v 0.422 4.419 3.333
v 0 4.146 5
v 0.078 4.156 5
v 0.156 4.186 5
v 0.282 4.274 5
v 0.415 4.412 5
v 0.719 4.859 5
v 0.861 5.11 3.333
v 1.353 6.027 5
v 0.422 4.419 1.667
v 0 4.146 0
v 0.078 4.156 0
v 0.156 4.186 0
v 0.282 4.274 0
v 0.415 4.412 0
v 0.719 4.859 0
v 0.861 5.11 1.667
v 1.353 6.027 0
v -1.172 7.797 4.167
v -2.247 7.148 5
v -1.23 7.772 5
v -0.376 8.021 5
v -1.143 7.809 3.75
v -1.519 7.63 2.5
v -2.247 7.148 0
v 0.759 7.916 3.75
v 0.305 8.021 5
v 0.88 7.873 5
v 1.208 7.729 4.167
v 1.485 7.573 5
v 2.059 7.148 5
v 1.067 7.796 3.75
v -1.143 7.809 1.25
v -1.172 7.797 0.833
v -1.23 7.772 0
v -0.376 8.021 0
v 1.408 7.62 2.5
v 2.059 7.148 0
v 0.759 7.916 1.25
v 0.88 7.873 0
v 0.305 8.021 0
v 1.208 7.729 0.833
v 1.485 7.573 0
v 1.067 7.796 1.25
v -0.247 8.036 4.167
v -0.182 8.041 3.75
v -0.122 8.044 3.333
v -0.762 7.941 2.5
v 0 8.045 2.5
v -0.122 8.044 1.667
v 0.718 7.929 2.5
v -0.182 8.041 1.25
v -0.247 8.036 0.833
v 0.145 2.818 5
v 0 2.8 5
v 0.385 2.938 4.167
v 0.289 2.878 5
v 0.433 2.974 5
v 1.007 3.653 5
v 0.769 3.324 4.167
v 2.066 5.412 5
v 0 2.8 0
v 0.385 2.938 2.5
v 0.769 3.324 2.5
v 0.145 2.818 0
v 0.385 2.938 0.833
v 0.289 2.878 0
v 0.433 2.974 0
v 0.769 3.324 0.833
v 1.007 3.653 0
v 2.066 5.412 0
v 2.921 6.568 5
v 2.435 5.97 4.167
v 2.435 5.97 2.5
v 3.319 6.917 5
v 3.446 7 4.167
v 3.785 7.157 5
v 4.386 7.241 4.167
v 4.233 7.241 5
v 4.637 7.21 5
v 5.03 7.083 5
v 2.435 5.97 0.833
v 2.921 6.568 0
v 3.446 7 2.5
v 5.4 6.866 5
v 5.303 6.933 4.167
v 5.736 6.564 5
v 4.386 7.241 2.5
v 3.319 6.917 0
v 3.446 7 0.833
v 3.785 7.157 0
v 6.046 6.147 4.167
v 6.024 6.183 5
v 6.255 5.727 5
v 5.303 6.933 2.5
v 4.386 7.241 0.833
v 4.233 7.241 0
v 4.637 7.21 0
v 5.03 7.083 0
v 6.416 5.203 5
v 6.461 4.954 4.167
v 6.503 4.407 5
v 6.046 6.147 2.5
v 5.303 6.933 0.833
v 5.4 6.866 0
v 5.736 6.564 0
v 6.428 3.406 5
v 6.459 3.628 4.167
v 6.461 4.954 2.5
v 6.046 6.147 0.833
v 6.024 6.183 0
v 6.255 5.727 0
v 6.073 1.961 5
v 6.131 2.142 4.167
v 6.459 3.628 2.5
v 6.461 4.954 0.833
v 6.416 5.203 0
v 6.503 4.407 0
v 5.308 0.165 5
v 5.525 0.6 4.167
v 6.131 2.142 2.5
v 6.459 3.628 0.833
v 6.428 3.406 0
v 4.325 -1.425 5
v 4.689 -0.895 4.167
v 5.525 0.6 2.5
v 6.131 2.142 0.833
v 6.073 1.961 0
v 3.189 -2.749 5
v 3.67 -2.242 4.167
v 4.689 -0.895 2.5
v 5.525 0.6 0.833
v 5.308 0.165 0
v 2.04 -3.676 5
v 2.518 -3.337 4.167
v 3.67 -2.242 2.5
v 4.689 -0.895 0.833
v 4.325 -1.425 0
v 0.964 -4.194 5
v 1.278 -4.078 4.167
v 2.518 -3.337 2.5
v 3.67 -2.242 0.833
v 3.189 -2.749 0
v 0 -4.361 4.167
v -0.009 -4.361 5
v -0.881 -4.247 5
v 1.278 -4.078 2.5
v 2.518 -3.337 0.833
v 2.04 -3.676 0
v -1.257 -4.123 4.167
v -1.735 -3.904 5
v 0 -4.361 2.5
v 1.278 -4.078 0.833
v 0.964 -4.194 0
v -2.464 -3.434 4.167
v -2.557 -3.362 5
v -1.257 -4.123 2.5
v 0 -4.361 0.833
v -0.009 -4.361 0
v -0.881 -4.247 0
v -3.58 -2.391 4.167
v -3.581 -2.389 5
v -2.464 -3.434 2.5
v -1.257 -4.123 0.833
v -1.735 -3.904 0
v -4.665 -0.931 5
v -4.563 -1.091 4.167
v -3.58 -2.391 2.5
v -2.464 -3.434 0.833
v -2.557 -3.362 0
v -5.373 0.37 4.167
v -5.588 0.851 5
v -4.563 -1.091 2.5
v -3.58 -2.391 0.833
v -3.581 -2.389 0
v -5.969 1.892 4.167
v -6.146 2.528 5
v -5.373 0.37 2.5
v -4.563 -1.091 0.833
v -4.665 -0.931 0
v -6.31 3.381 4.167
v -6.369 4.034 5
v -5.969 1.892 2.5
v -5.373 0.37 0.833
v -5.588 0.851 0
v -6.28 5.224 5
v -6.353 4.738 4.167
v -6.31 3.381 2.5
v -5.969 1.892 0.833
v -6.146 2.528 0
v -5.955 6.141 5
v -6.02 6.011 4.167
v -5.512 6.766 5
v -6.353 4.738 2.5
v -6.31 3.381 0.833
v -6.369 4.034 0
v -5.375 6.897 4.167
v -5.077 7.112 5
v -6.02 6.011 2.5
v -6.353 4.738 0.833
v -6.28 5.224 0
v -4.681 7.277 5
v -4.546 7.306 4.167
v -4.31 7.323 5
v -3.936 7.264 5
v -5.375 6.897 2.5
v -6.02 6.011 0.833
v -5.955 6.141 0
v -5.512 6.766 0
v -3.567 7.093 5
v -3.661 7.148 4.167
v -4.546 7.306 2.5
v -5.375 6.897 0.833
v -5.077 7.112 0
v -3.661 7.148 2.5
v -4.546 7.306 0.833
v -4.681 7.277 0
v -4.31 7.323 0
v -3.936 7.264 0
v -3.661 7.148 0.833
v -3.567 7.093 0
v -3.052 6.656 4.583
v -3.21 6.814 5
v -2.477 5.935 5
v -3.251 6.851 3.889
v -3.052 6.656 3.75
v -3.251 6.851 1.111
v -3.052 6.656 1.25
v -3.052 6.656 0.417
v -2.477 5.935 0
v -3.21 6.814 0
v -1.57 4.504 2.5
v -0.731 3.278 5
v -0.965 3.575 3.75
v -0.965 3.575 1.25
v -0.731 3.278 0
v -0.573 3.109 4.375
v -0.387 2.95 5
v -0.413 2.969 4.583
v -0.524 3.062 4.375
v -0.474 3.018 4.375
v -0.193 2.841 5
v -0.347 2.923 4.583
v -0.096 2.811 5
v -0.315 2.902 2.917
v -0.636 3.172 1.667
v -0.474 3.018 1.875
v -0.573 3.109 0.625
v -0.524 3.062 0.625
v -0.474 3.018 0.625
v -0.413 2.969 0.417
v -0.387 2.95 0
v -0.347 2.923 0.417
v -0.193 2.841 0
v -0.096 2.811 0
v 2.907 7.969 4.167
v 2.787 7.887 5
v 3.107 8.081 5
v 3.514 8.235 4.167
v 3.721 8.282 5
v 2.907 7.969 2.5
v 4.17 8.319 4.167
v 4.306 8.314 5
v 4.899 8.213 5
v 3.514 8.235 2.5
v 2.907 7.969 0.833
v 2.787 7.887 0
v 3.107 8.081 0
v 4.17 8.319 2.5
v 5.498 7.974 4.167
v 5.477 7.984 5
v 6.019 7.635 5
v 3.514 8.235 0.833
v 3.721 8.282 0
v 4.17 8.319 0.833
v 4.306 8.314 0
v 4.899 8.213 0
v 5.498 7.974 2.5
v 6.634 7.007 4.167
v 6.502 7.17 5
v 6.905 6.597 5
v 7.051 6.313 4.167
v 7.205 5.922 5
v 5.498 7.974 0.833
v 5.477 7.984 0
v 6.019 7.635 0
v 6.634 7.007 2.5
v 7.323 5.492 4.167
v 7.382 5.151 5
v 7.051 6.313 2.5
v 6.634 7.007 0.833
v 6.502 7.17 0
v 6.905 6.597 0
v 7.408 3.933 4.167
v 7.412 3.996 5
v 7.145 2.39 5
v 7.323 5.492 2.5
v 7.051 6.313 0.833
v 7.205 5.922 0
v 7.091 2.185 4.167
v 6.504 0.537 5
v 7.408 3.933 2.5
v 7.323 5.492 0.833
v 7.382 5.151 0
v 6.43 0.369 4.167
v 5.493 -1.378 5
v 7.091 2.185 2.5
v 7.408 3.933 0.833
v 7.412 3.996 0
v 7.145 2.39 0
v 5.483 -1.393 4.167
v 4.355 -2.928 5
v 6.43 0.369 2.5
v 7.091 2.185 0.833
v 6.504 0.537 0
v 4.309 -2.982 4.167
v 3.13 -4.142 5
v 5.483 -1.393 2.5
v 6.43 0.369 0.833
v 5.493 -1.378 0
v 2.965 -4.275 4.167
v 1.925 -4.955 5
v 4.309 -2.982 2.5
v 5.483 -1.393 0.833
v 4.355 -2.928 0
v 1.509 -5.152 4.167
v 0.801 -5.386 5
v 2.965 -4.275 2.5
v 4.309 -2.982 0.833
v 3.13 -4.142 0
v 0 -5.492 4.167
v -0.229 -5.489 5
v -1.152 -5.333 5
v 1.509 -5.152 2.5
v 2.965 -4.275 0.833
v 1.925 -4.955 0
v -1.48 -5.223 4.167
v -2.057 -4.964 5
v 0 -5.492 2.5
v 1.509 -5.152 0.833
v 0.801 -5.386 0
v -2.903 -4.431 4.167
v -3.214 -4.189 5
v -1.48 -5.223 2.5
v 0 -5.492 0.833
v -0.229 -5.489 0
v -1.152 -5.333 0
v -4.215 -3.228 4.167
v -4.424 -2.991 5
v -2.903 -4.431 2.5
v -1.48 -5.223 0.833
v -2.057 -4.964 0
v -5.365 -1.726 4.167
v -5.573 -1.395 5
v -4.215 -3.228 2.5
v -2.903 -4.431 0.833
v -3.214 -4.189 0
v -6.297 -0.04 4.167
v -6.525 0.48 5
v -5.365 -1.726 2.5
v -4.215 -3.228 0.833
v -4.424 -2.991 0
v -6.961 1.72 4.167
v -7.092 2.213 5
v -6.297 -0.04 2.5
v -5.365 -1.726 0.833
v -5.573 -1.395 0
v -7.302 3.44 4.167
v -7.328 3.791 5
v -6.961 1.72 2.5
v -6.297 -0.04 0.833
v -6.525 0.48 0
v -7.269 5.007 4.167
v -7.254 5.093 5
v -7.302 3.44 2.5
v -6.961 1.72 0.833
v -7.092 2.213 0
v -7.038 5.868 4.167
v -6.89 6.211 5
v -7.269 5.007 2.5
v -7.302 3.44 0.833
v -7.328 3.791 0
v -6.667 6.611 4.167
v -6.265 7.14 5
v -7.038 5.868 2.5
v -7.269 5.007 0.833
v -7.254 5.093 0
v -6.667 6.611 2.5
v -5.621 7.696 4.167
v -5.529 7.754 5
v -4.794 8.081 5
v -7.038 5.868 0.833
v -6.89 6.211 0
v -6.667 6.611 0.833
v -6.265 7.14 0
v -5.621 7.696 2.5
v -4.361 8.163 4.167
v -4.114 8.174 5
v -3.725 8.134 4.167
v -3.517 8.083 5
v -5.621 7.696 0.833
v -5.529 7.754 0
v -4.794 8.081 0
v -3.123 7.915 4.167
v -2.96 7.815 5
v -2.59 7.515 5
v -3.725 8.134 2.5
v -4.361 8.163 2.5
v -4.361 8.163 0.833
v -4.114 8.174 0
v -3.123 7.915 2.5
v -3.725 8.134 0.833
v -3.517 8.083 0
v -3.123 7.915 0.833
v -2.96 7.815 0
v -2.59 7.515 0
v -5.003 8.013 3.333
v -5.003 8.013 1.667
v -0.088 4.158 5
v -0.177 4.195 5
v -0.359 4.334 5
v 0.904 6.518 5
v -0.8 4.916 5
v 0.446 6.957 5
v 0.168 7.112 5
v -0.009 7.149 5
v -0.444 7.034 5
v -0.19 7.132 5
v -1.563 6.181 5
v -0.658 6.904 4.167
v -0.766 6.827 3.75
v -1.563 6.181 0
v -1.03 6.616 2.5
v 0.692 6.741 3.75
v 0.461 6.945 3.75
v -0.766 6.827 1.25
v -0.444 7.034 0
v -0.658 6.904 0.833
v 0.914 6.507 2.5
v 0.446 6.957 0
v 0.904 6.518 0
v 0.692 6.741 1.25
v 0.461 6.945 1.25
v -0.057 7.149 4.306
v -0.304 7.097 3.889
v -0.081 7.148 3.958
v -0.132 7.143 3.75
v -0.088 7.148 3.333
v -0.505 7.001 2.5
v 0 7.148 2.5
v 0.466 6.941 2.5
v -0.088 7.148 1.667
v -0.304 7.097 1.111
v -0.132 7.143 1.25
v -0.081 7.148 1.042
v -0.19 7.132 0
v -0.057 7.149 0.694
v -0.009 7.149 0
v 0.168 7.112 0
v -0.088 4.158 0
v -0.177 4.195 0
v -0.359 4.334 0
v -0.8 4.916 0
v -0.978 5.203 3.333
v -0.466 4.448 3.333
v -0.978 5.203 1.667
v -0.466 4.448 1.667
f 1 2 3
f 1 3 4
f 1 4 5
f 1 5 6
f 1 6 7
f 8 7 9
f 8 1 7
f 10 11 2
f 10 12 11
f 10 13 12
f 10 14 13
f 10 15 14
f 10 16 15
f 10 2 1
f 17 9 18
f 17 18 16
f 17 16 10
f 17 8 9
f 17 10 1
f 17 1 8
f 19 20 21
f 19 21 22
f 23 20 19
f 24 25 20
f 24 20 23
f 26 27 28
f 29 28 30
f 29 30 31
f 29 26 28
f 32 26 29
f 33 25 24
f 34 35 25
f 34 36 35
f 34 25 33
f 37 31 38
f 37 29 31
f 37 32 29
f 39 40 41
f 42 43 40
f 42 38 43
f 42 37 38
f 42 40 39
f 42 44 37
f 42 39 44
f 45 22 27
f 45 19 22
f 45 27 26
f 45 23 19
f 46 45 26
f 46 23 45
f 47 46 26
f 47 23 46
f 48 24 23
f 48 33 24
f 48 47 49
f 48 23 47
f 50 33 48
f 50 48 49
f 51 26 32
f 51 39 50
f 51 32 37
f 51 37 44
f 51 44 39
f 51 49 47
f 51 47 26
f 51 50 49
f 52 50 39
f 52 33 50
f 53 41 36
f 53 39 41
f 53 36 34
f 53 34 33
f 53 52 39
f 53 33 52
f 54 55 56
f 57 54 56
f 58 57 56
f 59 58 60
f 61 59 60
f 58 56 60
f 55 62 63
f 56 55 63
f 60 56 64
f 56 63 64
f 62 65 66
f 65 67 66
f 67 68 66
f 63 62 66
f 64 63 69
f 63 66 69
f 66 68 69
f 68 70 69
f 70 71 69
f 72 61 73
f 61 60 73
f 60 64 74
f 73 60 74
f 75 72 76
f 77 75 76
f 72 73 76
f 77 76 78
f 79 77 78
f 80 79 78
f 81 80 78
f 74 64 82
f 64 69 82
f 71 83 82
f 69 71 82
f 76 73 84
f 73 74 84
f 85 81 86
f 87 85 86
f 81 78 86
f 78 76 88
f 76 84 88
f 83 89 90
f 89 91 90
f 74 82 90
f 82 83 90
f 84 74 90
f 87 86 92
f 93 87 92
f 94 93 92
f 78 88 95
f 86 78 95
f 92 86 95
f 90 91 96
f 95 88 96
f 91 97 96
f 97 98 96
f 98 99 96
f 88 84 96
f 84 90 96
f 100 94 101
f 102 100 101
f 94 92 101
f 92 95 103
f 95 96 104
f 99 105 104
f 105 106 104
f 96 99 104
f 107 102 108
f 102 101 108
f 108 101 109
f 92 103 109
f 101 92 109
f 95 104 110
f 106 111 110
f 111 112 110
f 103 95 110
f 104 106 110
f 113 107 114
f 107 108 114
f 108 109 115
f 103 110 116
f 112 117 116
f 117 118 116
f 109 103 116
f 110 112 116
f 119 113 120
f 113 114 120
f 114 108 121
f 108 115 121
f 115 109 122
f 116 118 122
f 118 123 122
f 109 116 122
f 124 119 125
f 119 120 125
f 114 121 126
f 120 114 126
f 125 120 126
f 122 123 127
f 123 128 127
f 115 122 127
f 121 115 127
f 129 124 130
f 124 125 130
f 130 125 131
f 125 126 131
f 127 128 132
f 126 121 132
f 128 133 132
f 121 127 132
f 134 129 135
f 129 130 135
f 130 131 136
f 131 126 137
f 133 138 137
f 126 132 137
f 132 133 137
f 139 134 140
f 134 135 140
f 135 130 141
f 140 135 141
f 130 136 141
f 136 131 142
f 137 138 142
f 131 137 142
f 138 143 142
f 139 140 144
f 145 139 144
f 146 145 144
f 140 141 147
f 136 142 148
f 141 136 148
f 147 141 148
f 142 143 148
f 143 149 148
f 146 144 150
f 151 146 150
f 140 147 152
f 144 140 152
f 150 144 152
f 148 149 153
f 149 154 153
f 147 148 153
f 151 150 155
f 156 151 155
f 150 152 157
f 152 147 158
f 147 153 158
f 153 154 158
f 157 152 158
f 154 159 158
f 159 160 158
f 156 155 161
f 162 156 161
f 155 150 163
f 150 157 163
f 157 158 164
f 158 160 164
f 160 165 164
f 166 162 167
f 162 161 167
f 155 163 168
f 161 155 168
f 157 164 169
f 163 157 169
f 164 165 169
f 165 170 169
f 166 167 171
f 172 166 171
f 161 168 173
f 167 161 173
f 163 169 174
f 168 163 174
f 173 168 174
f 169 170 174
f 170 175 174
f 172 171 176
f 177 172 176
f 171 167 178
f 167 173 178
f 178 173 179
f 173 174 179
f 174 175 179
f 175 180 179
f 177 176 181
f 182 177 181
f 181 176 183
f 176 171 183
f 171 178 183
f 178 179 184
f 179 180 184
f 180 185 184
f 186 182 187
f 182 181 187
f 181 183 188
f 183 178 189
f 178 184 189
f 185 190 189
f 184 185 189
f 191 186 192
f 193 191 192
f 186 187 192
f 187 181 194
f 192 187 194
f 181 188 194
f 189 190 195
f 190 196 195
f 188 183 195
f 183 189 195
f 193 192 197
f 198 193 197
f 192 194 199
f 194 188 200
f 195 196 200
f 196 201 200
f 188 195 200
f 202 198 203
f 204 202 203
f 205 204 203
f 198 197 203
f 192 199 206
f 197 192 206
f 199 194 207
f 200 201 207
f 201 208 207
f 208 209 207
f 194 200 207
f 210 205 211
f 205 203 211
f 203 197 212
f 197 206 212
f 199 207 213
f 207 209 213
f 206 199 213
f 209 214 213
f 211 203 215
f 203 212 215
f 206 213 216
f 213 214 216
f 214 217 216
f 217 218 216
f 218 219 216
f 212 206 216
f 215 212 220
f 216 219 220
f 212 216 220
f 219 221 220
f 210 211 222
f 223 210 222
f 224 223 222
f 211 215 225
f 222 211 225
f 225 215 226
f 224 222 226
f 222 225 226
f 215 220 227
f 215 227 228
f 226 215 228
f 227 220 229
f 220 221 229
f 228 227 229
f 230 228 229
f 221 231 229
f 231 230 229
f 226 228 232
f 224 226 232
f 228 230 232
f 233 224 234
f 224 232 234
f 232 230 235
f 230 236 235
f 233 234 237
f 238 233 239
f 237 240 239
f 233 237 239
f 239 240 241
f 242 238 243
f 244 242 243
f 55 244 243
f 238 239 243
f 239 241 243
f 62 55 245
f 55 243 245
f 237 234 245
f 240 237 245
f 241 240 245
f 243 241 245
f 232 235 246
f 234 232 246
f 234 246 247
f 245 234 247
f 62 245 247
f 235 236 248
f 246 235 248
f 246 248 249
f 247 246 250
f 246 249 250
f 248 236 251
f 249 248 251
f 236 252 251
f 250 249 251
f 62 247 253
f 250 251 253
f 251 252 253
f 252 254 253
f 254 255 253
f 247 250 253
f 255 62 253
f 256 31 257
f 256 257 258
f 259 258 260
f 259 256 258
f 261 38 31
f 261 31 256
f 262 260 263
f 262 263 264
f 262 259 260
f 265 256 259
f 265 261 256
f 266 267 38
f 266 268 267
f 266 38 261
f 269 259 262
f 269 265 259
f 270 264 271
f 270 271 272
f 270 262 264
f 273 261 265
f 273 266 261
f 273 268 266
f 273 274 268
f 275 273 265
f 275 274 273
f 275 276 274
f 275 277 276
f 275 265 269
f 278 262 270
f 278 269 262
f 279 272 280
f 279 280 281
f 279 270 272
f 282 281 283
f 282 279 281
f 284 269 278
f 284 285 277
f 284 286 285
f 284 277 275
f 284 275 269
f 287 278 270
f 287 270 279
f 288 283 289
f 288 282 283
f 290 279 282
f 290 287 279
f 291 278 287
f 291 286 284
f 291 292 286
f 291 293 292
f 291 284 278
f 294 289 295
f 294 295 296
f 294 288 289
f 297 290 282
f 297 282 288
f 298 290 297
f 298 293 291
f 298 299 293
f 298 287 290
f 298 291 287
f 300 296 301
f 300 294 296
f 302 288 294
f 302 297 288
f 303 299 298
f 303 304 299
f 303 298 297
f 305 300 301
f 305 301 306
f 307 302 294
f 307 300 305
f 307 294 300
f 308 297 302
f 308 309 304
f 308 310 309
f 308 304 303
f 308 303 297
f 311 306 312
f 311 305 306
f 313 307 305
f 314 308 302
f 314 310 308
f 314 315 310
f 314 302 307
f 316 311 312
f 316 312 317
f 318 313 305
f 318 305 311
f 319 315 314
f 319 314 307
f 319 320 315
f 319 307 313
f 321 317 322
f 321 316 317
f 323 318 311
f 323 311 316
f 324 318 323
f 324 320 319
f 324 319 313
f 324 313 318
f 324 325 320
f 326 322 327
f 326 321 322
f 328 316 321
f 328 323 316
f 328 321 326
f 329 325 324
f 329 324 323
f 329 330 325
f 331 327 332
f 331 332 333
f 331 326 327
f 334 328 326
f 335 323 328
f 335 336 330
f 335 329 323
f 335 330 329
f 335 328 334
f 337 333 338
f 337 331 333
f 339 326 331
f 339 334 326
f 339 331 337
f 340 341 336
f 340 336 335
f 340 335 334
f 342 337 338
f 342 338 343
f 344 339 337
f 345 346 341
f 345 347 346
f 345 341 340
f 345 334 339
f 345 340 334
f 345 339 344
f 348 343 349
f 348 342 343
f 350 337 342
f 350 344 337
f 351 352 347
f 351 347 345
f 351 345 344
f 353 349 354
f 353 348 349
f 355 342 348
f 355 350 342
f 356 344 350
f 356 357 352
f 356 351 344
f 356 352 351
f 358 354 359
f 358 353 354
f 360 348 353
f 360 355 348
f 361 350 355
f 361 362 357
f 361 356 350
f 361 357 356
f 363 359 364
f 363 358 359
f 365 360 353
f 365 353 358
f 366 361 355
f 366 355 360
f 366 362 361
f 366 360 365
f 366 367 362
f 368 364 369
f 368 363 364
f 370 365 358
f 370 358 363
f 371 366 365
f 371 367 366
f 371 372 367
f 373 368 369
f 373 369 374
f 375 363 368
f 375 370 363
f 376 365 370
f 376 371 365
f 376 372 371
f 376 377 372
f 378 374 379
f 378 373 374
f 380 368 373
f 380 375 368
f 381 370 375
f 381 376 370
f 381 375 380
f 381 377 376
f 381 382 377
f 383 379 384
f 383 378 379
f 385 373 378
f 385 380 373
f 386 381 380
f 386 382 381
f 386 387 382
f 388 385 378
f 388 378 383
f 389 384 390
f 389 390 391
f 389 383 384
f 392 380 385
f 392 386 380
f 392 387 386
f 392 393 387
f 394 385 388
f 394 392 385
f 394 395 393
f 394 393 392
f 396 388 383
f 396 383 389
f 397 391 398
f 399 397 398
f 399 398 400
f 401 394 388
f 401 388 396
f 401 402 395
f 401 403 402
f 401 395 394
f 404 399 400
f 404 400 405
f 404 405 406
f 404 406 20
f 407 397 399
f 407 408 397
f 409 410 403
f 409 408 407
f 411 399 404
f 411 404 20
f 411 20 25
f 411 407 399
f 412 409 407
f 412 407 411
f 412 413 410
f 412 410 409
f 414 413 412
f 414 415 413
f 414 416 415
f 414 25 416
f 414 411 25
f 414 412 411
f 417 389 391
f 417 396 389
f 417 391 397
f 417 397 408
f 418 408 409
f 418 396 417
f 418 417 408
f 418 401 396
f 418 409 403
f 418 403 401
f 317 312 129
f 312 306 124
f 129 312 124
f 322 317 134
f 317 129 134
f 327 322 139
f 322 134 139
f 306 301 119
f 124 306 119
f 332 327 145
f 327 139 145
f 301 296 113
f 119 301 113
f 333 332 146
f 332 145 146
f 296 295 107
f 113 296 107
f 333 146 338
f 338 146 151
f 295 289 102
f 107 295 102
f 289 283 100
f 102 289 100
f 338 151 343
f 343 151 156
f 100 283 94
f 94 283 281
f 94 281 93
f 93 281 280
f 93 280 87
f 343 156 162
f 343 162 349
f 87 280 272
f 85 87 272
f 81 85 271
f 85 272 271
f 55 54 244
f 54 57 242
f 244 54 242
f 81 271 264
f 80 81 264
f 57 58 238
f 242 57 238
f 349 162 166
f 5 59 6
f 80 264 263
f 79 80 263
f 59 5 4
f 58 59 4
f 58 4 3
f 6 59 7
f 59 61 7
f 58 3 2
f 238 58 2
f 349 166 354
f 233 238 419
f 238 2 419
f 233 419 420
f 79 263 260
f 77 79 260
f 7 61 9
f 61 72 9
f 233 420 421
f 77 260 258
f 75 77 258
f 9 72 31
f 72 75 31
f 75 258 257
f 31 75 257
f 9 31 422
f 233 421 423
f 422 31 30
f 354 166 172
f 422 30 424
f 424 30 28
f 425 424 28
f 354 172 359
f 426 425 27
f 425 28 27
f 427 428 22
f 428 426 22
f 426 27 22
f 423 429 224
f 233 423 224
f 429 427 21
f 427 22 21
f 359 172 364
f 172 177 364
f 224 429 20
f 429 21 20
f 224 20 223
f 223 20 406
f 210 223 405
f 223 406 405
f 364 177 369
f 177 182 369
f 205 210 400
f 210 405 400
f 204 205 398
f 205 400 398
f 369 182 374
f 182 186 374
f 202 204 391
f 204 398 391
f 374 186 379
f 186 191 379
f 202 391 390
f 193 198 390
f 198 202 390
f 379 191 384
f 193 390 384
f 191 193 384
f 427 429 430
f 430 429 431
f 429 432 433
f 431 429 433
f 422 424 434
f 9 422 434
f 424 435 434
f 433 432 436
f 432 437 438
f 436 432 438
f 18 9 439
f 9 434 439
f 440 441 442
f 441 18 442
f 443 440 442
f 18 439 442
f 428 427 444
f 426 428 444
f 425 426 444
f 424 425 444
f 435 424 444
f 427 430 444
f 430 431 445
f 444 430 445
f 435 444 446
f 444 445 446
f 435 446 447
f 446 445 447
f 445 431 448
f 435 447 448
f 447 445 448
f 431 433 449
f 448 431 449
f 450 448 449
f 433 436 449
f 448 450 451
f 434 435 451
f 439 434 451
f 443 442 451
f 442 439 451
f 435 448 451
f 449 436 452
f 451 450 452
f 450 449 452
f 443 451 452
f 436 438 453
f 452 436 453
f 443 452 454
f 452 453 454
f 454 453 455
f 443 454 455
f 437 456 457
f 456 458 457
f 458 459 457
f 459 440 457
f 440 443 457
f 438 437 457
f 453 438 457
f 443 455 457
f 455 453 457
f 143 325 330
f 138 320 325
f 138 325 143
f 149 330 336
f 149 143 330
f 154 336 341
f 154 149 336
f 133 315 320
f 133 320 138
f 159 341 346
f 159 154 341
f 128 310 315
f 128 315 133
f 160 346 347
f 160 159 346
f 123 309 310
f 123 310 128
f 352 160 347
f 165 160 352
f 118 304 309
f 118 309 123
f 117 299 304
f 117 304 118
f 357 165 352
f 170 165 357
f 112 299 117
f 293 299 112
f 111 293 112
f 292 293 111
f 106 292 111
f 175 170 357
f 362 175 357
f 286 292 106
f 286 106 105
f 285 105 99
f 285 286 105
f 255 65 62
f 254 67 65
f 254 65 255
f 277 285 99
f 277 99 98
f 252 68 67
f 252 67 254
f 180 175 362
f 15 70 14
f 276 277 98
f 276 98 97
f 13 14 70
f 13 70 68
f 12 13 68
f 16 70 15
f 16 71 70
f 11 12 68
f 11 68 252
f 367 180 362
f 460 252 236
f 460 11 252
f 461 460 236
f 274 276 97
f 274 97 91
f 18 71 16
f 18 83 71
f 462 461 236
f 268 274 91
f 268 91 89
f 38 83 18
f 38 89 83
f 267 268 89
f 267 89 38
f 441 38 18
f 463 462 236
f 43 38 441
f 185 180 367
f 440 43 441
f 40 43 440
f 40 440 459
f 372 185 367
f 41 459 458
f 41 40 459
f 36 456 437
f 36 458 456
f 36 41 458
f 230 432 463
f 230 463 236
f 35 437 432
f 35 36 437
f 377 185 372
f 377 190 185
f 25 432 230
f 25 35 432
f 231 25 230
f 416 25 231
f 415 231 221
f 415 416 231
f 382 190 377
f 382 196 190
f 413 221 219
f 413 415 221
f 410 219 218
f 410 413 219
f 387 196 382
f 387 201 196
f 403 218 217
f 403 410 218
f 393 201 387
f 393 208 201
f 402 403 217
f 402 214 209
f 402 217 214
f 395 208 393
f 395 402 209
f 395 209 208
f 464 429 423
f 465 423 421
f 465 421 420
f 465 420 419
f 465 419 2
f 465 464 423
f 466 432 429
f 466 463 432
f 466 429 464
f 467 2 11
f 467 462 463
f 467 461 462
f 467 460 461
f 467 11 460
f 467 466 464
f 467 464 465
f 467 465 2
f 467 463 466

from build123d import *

# Parameters (mm, degrees)
F1_DEPTH = 5
F2_DEPTH = 5


with BuildPart() as f1:
    # F0 (on Top) → F1 (new body)
    with BuildSketch(Plane.XY):
        with BuildLine():
            add(Edge.make_bspline(
                [(0, 4.1458761205), (0.4251728121, 4.1469714189), (0.8223929175, 5.0606502095), (1.3531749, 6.0265546593)],
                knots=[0, 0, 0, 0, 0.0765595149, 0.0765595149, 0.0765595149, 0.0765595149], degree=3))
            add(Edge.make_bspline(
                [(-1.5634586702, 6.1805757618), (-0.9330409116, 5.1694999873), (-0.4508079304, 4.1447147827), (0, 4.1458761205)],
                knots=[0.9188244509, 0.9188244509, 0.9188244509, 0.9188244509, 1, 1, 1, 1], degree=3))
            add(Edge.make_bspline(
                [(-2.2471202075, 7.1480078623), (-1.9999117313, 6.8526730124), (-1.7734632609, 6.5173850463), (-1.5634586702, 6.1805757618)],
                knots=[0.8917832743, 0.8917832743, 0.8917832743, 0.8917832743, 0.9188244509, 0.9188244509, 0.9188244509, 0.9188244509], degree=3))
            add(Edge.make_bspline(
                [(2.0587463653, 7.1480078623), (2.3102169642, 7.4789881542), (3.9352571105, 9.1579500365), (10.6718271376, 6.0896679143), (0.0174467047, -12.3922555257), (-10.3794205218, 5.354508724), (-4.1956157642, 9.0408248225), (-2.5131929277, 7.465879434), (-2.2471202075, 7.1480078623)],
                knots=[0.1069595135, 0.1069595135, 0.1069595135, 0.1069595135, 0.1360278888, 0.2756819795, 0.5011998203, 0.7230047753, 0.8626786112, 0.8917832743, 0.8917832743, 0.8917832743, 0.8917832743], degree=3))
            add(Edge.make_bspline(
                [(1.3531749, 6.0265546593), (1.5639360512, 6.4100927984), (1.7957558897, 6.8018653518), (2.0587463653, 7.1480078623)],
                knots=[0.0765595149, 0.0765595149, 0.0765595149, 0.0765595149, 0.1069595135, 0.1069595135, 0.1069595135, 0.1069595135], degree=3))
        make_face()
        with BuildLine():
            add(Edge.make_bspline(
                [(0, 2.7998123893), (1.0340989918, 2.7791406676), (2.7557970722, 8.8582789448), (8.9245705944, 5.1398418843), (-0.0594070879, -10.2722849706), (-8.5444707281, 4.6876552471), (-3.1236585147, 9.1828392806), (-1.057798358, 2.8209578633), (0, 2.7998123893)],
                knots=[0, 0, 0, 0, 0.1531088486, 0.27850369, 0.4996783225, 0.7185160732, 0.8433822197, 1, 1, 1, 1], degree=3))
        make_face(mode=Mode.SUBTRACT)
        with BuildLine():
            add(Edge.make_bspline(
                [(-1.5634586702, 6.1805757618), (-1.0298012679, 6.5793822208), (0.0361797885, 7.7721255402), (0.9136382907, 6.471155864), (1.3531749, 6.0265546593)],
                knots=[0, 0, 0, 0, 0.5056378611, 1, 1, 1, 1], degree=3))
            add(Edge.make_bspline(
                [(1.3531749, 6.0265546593), (1.5639360512, 6.4100927984), (1.7957558897, 6.8018653518), (2.0587463653, 7.1480078623)],
                knots=[0.0765595149, 0.0765595149, 0.0765595149, 0.0765595149, 0.1069595135, 0.1069595135, 0.1069595135, 0.1069595135], degree=3))
            add(Edge.make_bspline(
                [(-2.2471202075, 7.1480078623), (-1.5414069401, 7.7049818886), (-0.0003649889, 8.3928342759), (1.4313487957, 7.6905926173), (2.0587463653, 7.1480078623)],
                knots=[0, 0, 0, 0, 0.5093201493, 1, 1, 1, 1], degree=3))
            add(Edge.make_bspline(
                [(-2.2471202075, 7.1480078623), (-1.9999117313, 6.8526730124), (-1.7734632609, 6.5173850463), (-1.5634586702, 6.1805757618)],
                knots=[0.8917832743, 0.8917832743, 0.8917832743, 0.8917832743, 0.9188244509, 0.9188244509, 0.9188244509, 0.9188244509], degree=3))
        make_face()
    extrude(amount=F1_DEPTH)

    # F0 (on Top) → F2 (join)
    with BuildSketch(Plane.XY):
        with BuildLine():
            add(Edge.make_bspline(
                [(0, 4.1458761205), (0.4251728121, 4.1469714189), (0.8223929175, 5.0606502095), (1.3531749, 6.0265546593)],
                knots=[0, 0, 0, 0, 0.0765595149, 0.0765595149, 0.0765595149, 0.0765595149], degree=3))
            add(Edge.make_bspline(
                [(-1.5634586702, 6.1805757618), (-0.9330409116, 5.1694999873), (-0.4508079304, 4.1447147827), (0, 4.1458761205)],
                knots=[0.9188244509, 0.9188244509, 0.9188244509, 0.9188244509, 1, 1, 1, 1], degree=3))
            add(Edge.make_bspline(
                [(-2.2471202075, 7.1480078623), (-1.9999117313, 6.8526730124), (-1.7734632609, 6.5173850463), (-1.5634586702, 6.1805757618)],
                knots=[0.8917832743, 0.8917832743, 0.8917832743, 0.8917832743, 0.9188244509, 0.9188244509, 0.9188244509, 0.9188244509], degree=3))
            add(Edge.make_bspline(
                [(2.0587463653, 7.1480078623), (2.3102169642, 7.4789881542), (3.9352571105, 9.1579500365), (10.6718271376, 6.0896679143), (0.0174467047, -12.3922555257), (-10.3794205218, 5.354508724), (-4.1956157642, 9.0408248225), (-2.5131929277, 7.465879434), (-2.2471202075, 7.1480078623)],
                knots=[0.1069595135, 0.1069595135, 0.1069595135, 0.1069595135, 0.1360278888, 0.2756819795, 0.5011998203, 0.7230047753, 0.8626786112, 0.8917832743, 0.8917832743, 0.8917832743, 0.8917832743], degree=3))
            add(Edge.make_bspline(
                [(1.3531749, 6.0265546593), (1.5639360512, 6.4100927984), (1.7957558897, 6.8018653518), (2.0587463653, 7.1480078623)],
                knots=[0.0765595149, 0.0765595149, 0.0765595149, 0.0765595149, 0.1069595135, 0.1069595135, 0.1069595135, 0.1069595135], degree=3))
        make_face()
        with BuildLine():
            add(Edge.make_bspline(
                [(0, 2.7998123893), (1.0340989918, 2.7791406676), (2.7557970722, 8.8582789448), (8.9245705944, 5.1398418843), (-0.0594070879, -10.2722849706), (-8.5444707281, 4.6876552471), (-3.1236585147, 9.1828392806), (-1.057798358, 2.8209578633), (0, 2.7998123893)],
                knots=[0, 0, 0, 0, 0.1531088486, 0.27850369, 0.4996783225, 0.7185160732, 0.8433822197, 1, 1, 1, 1], degree=3))
        make_face(mode=Mode.SUBTRACT)
        with BuildLine():
            add(Edge.make_bspline(
                [(-1.5634586702, 6.1805757618), (-1.0298012679, 6.5793822208), (0.0361797885, 7.7721255402), (0.9136382907, 6.471155864), (1.3531749, 6.0265546593)],
                knots=[0, 0, 0, 0, 0.5056378611, 1, 1, 1, 1], degree=3))
            add(Edge.make_bspline(
                [(1.3531749, 6.0265546593), (1.5639360512, 6.4100927984), (1.7957558897, 6.8018653518), (2.0587463653, 7.1480078623)],
                knots=[0.0765595149, 0.0765595149, 0.0765595149, 0.0765595149, 0.1069595135, 0.1069595135, 0.1069595135, 0.1069595135], degree=3))
            add(Edge.make_bspline(
                [(-2.2471202075, 7.1480078623), (-1.5414069401, 7.7049818886), (-0.0003649889, 8.3928342759), (1.4313487957, 7.6905926173), (2.0587463653, 7.1480078623)],
                knots=[0, 0, 0, 0, 0.5093201493, 1, 1, 1, 1], degree=3))
            add(Edge.make_bspline(
                [(-2.2471202075, 7.1480078623), (-1.9999117313, 6.8526730124), (-1.7734632609, 6.5173850463), (-1.5634586702, 6.1805757618)],
                knots=[0.8917832743, 0.8917832743, 0.8917832743, 0.8917832743, 0.9188244509, 0.9188244509, 0.9188244509, 0.9188244509], degree=3))
        make_face()
    extrude(amount=F2_DEPTH)


solid = f1.part
